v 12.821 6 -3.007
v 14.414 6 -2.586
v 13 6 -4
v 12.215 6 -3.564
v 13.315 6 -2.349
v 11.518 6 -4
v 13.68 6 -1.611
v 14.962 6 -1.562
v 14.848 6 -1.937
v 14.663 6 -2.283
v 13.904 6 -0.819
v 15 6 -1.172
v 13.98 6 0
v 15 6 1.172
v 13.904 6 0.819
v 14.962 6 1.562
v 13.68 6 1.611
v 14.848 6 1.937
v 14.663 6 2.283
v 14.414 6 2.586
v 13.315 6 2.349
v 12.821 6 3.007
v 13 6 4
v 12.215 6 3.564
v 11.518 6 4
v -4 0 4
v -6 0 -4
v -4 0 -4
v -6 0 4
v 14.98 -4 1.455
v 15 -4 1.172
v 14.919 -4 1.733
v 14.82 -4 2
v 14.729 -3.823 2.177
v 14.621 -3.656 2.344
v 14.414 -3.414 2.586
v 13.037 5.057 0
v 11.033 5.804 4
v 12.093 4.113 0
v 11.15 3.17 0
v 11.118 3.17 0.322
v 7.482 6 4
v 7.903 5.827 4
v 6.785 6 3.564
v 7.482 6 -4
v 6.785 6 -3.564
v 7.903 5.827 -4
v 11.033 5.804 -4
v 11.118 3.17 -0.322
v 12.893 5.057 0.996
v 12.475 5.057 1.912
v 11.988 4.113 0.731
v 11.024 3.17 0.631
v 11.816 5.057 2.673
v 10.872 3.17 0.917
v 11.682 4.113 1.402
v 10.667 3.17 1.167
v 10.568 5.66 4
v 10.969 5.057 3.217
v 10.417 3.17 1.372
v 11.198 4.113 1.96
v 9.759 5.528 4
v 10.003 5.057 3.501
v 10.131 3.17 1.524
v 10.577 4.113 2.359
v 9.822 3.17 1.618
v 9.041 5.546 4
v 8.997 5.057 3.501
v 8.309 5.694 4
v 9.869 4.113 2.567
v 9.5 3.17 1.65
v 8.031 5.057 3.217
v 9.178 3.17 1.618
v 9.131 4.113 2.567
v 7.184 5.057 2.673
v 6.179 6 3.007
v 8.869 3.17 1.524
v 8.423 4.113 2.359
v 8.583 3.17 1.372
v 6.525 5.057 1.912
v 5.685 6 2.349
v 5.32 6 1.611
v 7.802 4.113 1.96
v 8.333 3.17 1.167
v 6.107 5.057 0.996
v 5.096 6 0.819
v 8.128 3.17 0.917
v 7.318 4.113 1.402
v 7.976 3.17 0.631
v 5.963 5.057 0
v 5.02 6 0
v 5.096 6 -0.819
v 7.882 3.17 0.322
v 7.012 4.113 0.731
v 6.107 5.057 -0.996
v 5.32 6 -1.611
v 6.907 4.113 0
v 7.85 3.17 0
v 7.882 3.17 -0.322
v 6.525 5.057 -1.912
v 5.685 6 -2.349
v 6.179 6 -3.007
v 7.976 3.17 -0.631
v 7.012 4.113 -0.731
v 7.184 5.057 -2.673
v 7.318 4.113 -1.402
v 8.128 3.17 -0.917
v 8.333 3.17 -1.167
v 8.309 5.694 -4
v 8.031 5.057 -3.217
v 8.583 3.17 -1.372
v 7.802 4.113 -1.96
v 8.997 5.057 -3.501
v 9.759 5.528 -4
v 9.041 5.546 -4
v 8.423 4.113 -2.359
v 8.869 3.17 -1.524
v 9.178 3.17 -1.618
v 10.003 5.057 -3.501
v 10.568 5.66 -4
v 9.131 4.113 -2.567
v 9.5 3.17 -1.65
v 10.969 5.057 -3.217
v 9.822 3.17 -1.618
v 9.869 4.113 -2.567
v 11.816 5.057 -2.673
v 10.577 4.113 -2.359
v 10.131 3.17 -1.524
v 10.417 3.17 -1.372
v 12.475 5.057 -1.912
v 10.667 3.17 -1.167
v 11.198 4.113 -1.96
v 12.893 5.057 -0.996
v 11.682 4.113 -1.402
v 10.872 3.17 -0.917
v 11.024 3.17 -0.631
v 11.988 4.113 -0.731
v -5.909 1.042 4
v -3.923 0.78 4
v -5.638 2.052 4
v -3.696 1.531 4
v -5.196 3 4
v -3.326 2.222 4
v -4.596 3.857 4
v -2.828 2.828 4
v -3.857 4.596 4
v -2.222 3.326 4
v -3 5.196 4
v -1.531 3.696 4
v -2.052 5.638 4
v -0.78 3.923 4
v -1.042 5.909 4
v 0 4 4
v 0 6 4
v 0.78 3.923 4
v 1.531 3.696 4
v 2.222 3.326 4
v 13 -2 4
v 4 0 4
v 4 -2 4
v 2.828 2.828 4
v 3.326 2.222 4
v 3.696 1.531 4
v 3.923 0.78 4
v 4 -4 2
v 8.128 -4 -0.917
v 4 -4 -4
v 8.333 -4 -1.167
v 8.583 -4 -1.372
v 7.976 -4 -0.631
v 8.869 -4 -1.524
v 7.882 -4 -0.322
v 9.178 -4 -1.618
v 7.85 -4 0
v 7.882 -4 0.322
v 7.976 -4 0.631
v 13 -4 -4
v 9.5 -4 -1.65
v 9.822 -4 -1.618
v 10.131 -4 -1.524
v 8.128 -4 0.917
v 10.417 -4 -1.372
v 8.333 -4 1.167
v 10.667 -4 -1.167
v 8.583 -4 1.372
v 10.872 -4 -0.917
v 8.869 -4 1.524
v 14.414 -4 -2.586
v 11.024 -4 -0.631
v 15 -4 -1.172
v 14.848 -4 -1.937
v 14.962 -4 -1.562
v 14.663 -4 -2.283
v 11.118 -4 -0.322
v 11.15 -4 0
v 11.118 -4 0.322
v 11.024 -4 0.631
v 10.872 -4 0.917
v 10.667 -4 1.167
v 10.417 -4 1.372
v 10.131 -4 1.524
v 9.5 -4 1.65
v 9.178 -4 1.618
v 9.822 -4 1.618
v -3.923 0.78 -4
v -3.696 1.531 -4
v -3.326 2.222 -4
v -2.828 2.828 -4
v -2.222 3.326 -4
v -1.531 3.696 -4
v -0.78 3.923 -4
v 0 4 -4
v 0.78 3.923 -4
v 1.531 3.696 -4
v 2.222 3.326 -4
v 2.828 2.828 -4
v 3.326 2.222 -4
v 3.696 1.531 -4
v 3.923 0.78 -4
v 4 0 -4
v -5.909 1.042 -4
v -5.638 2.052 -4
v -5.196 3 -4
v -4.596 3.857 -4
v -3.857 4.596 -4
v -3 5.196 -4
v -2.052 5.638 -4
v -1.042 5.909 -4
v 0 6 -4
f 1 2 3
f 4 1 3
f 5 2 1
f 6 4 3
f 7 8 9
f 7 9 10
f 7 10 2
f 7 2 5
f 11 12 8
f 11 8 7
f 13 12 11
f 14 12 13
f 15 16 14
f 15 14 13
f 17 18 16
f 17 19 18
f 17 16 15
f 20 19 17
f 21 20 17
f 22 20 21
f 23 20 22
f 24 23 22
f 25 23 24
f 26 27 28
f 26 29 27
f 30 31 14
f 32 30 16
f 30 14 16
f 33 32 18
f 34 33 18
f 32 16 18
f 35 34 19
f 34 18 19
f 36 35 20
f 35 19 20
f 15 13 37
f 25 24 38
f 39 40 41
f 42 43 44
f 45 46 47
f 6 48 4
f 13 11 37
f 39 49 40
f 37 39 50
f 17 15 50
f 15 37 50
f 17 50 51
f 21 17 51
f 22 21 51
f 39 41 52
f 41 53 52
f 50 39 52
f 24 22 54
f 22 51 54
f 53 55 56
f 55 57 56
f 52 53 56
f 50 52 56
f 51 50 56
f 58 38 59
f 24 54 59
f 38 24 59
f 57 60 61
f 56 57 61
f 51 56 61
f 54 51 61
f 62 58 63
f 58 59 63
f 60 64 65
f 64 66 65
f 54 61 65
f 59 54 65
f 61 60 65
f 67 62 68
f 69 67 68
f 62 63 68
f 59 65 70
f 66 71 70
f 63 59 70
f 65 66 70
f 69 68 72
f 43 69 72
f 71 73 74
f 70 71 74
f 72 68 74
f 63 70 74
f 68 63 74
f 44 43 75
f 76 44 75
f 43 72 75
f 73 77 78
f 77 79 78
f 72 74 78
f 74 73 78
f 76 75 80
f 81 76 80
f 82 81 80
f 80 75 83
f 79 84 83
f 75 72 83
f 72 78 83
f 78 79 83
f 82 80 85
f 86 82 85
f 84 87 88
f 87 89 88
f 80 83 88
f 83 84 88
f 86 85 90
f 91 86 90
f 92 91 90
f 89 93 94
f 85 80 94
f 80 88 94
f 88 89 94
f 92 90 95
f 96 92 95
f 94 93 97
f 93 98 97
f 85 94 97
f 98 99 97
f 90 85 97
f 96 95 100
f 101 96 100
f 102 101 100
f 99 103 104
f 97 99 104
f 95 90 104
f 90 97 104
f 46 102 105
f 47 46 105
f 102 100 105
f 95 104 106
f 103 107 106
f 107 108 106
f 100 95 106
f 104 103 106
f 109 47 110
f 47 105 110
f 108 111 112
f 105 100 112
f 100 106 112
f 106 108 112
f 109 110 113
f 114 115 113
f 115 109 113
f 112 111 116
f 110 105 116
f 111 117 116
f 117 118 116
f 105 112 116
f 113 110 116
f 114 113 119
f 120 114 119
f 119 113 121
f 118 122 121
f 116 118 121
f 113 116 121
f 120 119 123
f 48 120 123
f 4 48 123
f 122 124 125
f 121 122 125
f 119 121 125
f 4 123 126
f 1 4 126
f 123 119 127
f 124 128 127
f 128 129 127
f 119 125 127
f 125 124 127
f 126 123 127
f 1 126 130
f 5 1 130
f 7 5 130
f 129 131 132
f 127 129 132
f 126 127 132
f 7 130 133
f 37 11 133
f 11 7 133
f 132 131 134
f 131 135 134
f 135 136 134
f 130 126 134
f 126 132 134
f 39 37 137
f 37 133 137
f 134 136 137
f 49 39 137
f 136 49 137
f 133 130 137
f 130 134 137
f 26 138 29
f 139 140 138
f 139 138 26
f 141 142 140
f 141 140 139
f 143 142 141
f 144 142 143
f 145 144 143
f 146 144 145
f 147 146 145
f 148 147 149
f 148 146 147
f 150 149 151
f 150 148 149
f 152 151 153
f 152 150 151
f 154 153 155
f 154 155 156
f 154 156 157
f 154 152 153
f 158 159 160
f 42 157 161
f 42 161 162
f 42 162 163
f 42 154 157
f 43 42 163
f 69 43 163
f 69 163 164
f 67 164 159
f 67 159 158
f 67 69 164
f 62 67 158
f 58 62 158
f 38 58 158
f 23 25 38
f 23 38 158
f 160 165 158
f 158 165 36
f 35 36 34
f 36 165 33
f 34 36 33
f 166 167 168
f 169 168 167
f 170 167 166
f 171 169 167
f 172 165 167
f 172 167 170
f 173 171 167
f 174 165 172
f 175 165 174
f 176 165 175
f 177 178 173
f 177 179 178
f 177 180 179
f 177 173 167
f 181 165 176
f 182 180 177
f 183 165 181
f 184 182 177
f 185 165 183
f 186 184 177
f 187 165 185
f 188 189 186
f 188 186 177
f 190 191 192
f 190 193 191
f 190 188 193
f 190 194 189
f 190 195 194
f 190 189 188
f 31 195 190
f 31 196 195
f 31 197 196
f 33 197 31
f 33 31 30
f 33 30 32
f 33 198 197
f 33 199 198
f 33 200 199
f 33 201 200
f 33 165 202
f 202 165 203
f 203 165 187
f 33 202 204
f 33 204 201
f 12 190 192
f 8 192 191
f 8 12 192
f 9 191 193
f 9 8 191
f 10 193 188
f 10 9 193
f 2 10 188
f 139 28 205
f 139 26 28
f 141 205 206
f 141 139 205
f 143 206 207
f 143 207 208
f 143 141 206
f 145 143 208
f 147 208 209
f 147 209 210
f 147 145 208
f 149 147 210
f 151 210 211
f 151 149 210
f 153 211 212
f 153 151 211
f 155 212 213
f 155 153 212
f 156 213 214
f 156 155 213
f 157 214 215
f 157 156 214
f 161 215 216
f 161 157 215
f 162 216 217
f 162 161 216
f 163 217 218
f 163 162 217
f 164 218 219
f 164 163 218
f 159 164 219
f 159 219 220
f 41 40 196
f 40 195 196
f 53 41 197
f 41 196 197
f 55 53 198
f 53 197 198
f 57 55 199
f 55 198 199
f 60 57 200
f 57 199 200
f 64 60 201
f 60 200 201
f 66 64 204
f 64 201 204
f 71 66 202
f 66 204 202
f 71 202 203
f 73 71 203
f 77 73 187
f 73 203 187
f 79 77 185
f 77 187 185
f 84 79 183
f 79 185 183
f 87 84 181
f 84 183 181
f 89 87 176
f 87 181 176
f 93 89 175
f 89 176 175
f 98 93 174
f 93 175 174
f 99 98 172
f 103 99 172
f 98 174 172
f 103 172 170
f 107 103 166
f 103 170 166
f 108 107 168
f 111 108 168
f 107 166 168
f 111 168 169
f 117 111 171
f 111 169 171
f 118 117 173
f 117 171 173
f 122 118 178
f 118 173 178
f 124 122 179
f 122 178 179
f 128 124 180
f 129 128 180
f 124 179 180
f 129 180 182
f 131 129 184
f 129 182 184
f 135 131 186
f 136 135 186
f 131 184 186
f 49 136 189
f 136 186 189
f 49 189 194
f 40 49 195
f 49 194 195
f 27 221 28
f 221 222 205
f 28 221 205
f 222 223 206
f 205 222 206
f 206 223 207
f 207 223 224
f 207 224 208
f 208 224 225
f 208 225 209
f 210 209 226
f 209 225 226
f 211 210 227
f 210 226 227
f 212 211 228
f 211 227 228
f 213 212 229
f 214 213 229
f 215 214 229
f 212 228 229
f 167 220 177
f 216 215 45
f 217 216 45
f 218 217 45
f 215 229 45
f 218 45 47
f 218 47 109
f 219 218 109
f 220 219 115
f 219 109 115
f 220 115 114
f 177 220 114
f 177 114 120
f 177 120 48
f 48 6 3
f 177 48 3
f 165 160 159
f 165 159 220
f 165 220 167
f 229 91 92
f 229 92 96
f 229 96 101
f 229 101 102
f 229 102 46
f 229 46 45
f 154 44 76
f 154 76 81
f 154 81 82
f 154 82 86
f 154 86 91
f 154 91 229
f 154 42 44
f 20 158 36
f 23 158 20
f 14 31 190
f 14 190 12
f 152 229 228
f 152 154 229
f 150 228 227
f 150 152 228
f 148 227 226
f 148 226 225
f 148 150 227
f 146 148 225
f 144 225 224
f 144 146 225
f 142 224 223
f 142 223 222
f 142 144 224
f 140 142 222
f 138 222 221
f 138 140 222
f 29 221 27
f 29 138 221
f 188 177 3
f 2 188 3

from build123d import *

# Parameters (mm, degrees)
F1_DEPTH       = 4
F3_D           = 3.3
F3_CSINK_D     = 8.96
F3_CSINK_ANGLE = 90
F4_SIZE        = 2
F5_R           = 2
F6_SIZE        = 2


with BuildPart() as f1:
    # F0 (on Top) → F1 (new body, symmetric)
    with BuildSketch(Plane.XY):
        with BuildLine():
            ThreePointArc((-4, 0), (0, 4), (4, 0))
            Line((4, 0), (4, -4))
            Line((4, -4), (15, -4))
            Line((15, -4), (15, 6))
            Line((15, 6), (0, 6))
            ThreePointArc((0, 6), (-4.2426406871, 4.2426406871), (-6, 0))
            Line((-6, 0), (-4, 0))
        make_face()
    extrude(amount=F1_DEPTH, both=True)

    # F3 (through all)
    with Locations(Plane(origin=(0, 6, 0), x_dir=(-1, 0, 0), z_dir=(0, 1, 0))):
        with Locations((-9.5, 0)):
            CounterSinkHole(F3_D / 2, F3_CSINK_D / 2, counter_sink_angle=F3_CSINK_ANGLE)

    # F4
    f4_edges = [f1.edges().sort_by_distance(p)[0] for p in [
        (15, 1, -4),
        (15, 1, 4),
    ]]
    chamfer(f4_edges, length=F4_SIZE)

    # F5
    f5_edges = [f1.edges().sort_by_distance(p)[0] for p in [
        (15, 1, 2),
        (15, 1, -2),
    ]]
    fillet(f5_edges, radius=F5_R)

    # F6
    f6_edges = [f1.edges().sort_by_distance(p)[0] for p in [
        (8.5, -4, 4),
    ]]
    chamfer(f6_edges, length=F6_SIZE)


solid = f1.part
